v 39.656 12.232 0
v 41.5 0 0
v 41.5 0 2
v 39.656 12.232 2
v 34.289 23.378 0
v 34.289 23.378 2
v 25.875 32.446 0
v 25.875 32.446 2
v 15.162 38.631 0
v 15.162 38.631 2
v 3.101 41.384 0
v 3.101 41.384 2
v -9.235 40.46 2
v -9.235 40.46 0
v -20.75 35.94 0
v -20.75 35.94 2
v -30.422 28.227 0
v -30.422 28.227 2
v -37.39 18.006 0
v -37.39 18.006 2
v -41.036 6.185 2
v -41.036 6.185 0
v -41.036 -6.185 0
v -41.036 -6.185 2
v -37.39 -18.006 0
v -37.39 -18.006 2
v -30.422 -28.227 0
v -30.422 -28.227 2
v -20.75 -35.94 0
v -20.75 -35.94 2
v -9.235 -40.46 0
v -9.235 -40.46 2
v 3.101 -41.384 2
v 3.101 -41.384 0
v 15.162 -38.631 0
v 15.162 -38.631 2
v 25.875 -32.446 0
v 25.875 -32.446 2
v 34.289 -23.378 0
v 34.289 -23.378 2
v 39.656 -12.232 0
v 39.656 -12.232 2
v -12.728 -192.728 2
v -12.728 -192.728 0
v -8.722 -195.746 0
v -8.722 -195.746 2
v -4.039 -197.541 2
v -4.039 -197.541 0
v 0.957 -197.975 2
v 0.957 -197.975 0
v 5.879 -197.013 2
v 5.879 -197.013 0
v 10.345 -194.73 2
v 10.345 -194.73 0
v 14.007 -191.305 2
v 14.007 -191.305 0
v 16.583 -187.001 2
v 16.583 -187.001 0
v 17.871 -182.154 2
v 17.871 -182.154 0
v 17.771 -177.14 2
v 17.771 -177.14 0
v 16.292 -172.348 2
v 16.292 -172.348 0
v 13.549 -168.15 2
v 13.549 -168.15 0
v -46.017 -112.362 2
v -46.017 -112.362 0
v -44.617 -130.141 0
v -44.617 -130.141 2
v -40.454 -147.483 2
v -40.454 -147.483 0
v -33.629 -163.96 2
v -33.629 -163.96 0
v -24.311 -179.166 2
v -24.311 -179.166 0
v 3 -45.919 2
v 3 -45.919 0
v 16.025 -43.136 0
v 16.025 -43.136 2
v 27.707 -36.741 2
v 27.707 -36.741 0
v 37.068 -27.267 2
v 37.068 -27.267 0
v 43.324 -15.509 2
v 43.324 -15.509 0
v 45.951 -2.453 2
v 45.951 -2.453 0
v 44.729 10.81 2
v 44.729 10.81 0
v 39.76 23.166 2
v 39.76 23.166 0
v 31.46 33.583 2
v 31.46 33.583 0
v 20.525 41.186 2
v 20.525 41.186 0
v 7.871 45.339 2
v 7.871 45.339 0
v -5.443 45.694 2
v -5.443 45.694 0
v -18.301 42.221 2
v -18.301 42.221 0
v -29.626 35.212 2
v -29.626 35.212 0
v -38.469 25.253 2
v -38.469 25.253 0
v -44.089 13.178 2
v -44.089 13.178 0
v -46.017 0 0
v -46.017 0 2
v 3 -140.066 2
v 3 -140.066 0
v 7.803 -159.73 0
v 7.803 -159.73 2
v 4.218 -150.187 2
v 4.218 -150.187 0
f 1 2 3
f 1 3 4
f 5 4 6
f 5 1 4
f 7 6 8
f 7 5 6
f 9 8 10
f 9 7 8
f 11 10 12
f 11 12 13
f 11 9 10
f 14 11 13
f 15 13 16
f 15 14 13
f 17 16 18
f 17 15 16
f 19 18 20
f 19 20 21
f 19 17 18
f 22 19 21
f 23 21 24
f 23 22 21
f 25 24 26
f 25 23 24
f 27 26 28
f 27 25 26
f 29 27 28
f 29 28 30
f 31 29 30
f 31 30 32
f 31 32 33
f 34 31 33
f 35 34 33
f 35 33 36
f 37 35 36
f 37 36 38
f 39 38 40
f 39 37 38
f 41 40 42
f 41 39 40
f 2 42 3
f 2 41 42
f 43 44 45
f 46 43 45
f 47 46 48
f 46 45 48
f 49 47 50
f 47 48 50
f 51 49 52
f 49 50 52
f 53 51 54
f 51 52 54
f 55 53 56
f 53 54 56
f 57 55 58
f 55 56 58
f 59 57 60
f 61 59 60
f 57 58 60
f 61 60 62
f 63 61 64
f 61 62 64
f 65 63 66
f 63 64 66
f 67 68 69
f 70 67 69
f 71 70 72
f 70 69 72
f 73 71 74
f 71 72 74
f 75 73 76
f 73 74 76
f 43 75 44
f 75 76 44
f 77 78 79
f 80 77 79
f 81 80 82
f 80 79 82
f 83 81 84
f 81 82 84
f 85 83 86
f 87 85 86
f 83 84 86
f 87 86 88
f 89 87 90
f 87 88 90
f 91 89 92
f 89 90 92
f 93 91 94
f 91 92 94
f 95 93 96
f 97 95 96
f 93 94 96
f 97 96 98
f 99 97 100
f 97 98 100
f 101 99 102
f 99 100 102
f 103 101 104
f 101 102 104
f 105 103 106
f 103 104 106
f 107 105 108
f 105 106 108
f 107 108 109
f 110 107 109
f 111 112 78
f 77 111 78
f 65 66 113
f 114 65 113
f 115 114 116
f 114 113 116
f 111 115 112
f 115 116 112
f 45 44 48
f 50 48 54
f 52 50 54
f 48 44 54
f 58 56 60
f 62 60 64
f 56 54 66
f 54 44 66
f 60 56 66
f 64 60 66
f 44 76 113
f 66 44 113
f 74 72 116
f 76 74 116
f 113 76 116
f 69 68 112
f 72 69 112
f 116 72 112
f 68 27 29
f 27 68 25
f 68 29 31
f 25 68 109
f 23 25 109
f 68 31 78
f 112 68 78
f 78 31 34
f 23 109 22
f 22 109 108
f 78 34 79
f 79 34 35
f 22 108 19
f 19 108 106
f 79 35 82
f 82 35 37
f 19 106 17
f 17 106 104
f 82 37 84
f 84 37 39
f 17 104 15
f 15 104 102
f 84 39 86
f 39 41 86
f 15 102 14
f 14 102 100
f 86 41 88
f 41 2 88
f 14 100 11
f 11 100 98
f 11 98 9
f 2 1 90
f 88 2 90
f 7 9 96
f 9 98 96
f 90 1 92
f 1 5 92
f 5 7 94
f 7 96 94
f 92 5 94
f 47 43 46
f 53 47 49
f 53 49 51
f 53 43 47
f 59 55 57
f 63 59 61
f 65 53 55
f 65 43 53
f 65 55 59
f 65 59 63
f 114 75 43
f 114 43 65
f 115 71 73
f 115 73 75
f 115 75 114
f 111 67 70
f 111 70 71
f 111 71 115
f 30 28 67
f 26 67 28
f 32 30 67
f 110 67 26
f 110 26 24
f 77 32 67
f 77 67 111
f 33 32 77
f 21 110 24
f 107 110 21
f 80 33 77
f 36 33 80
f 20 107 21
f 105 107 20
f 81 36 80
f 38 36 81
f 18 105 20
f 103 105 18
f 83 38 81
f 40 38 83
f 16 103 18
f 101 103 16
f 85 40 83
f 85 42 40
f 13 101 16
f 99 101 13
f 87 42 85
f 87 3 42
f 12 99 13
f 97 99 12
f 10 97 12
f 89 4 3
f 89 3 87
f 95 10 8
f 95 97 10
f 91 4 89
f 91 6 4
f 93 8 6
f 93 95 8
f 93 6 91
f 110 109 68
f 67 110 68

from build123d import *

# Parameters (mm, degrees)
SKETCH_1_R      = 41.5
EXTRUDE_1_DEPTH = 2


with BuildPart() as part:
    # 草图1 → 凸台-拉伸1 (new body)
    with BuildSketch(Plane.XY):
        with BuildLine():
            Line((3, -140.066053532), (3, -45.918827896))
            ThreePointArc((3, -45.918827896), (31.460201745, 33.582651198), (-46.016722562, 0))
            Line((-46.016722562, 0), (-46.016722562, -112.361648418))
            ThreePointArc((-46.016722562, -112.361648418), (-37.365245186, -155.855562297), (-12.727922061, -192.727922061))
            ThreePointArc((-12.727922061, -192.727922061), (12.295990665, -193.145669004), (13.548765941, -168.149643825))
            ThreePointArc((13.548765941, -168.149643825), (5.724176996, -155.065757751), (3, -140.066053532))
        make_face()
        Circle(SKETCH_1_R, mode=Mode.SUBTRACT)
    extrude(amount=EXTRUDE_1_DEPTH)


solid = part.part
